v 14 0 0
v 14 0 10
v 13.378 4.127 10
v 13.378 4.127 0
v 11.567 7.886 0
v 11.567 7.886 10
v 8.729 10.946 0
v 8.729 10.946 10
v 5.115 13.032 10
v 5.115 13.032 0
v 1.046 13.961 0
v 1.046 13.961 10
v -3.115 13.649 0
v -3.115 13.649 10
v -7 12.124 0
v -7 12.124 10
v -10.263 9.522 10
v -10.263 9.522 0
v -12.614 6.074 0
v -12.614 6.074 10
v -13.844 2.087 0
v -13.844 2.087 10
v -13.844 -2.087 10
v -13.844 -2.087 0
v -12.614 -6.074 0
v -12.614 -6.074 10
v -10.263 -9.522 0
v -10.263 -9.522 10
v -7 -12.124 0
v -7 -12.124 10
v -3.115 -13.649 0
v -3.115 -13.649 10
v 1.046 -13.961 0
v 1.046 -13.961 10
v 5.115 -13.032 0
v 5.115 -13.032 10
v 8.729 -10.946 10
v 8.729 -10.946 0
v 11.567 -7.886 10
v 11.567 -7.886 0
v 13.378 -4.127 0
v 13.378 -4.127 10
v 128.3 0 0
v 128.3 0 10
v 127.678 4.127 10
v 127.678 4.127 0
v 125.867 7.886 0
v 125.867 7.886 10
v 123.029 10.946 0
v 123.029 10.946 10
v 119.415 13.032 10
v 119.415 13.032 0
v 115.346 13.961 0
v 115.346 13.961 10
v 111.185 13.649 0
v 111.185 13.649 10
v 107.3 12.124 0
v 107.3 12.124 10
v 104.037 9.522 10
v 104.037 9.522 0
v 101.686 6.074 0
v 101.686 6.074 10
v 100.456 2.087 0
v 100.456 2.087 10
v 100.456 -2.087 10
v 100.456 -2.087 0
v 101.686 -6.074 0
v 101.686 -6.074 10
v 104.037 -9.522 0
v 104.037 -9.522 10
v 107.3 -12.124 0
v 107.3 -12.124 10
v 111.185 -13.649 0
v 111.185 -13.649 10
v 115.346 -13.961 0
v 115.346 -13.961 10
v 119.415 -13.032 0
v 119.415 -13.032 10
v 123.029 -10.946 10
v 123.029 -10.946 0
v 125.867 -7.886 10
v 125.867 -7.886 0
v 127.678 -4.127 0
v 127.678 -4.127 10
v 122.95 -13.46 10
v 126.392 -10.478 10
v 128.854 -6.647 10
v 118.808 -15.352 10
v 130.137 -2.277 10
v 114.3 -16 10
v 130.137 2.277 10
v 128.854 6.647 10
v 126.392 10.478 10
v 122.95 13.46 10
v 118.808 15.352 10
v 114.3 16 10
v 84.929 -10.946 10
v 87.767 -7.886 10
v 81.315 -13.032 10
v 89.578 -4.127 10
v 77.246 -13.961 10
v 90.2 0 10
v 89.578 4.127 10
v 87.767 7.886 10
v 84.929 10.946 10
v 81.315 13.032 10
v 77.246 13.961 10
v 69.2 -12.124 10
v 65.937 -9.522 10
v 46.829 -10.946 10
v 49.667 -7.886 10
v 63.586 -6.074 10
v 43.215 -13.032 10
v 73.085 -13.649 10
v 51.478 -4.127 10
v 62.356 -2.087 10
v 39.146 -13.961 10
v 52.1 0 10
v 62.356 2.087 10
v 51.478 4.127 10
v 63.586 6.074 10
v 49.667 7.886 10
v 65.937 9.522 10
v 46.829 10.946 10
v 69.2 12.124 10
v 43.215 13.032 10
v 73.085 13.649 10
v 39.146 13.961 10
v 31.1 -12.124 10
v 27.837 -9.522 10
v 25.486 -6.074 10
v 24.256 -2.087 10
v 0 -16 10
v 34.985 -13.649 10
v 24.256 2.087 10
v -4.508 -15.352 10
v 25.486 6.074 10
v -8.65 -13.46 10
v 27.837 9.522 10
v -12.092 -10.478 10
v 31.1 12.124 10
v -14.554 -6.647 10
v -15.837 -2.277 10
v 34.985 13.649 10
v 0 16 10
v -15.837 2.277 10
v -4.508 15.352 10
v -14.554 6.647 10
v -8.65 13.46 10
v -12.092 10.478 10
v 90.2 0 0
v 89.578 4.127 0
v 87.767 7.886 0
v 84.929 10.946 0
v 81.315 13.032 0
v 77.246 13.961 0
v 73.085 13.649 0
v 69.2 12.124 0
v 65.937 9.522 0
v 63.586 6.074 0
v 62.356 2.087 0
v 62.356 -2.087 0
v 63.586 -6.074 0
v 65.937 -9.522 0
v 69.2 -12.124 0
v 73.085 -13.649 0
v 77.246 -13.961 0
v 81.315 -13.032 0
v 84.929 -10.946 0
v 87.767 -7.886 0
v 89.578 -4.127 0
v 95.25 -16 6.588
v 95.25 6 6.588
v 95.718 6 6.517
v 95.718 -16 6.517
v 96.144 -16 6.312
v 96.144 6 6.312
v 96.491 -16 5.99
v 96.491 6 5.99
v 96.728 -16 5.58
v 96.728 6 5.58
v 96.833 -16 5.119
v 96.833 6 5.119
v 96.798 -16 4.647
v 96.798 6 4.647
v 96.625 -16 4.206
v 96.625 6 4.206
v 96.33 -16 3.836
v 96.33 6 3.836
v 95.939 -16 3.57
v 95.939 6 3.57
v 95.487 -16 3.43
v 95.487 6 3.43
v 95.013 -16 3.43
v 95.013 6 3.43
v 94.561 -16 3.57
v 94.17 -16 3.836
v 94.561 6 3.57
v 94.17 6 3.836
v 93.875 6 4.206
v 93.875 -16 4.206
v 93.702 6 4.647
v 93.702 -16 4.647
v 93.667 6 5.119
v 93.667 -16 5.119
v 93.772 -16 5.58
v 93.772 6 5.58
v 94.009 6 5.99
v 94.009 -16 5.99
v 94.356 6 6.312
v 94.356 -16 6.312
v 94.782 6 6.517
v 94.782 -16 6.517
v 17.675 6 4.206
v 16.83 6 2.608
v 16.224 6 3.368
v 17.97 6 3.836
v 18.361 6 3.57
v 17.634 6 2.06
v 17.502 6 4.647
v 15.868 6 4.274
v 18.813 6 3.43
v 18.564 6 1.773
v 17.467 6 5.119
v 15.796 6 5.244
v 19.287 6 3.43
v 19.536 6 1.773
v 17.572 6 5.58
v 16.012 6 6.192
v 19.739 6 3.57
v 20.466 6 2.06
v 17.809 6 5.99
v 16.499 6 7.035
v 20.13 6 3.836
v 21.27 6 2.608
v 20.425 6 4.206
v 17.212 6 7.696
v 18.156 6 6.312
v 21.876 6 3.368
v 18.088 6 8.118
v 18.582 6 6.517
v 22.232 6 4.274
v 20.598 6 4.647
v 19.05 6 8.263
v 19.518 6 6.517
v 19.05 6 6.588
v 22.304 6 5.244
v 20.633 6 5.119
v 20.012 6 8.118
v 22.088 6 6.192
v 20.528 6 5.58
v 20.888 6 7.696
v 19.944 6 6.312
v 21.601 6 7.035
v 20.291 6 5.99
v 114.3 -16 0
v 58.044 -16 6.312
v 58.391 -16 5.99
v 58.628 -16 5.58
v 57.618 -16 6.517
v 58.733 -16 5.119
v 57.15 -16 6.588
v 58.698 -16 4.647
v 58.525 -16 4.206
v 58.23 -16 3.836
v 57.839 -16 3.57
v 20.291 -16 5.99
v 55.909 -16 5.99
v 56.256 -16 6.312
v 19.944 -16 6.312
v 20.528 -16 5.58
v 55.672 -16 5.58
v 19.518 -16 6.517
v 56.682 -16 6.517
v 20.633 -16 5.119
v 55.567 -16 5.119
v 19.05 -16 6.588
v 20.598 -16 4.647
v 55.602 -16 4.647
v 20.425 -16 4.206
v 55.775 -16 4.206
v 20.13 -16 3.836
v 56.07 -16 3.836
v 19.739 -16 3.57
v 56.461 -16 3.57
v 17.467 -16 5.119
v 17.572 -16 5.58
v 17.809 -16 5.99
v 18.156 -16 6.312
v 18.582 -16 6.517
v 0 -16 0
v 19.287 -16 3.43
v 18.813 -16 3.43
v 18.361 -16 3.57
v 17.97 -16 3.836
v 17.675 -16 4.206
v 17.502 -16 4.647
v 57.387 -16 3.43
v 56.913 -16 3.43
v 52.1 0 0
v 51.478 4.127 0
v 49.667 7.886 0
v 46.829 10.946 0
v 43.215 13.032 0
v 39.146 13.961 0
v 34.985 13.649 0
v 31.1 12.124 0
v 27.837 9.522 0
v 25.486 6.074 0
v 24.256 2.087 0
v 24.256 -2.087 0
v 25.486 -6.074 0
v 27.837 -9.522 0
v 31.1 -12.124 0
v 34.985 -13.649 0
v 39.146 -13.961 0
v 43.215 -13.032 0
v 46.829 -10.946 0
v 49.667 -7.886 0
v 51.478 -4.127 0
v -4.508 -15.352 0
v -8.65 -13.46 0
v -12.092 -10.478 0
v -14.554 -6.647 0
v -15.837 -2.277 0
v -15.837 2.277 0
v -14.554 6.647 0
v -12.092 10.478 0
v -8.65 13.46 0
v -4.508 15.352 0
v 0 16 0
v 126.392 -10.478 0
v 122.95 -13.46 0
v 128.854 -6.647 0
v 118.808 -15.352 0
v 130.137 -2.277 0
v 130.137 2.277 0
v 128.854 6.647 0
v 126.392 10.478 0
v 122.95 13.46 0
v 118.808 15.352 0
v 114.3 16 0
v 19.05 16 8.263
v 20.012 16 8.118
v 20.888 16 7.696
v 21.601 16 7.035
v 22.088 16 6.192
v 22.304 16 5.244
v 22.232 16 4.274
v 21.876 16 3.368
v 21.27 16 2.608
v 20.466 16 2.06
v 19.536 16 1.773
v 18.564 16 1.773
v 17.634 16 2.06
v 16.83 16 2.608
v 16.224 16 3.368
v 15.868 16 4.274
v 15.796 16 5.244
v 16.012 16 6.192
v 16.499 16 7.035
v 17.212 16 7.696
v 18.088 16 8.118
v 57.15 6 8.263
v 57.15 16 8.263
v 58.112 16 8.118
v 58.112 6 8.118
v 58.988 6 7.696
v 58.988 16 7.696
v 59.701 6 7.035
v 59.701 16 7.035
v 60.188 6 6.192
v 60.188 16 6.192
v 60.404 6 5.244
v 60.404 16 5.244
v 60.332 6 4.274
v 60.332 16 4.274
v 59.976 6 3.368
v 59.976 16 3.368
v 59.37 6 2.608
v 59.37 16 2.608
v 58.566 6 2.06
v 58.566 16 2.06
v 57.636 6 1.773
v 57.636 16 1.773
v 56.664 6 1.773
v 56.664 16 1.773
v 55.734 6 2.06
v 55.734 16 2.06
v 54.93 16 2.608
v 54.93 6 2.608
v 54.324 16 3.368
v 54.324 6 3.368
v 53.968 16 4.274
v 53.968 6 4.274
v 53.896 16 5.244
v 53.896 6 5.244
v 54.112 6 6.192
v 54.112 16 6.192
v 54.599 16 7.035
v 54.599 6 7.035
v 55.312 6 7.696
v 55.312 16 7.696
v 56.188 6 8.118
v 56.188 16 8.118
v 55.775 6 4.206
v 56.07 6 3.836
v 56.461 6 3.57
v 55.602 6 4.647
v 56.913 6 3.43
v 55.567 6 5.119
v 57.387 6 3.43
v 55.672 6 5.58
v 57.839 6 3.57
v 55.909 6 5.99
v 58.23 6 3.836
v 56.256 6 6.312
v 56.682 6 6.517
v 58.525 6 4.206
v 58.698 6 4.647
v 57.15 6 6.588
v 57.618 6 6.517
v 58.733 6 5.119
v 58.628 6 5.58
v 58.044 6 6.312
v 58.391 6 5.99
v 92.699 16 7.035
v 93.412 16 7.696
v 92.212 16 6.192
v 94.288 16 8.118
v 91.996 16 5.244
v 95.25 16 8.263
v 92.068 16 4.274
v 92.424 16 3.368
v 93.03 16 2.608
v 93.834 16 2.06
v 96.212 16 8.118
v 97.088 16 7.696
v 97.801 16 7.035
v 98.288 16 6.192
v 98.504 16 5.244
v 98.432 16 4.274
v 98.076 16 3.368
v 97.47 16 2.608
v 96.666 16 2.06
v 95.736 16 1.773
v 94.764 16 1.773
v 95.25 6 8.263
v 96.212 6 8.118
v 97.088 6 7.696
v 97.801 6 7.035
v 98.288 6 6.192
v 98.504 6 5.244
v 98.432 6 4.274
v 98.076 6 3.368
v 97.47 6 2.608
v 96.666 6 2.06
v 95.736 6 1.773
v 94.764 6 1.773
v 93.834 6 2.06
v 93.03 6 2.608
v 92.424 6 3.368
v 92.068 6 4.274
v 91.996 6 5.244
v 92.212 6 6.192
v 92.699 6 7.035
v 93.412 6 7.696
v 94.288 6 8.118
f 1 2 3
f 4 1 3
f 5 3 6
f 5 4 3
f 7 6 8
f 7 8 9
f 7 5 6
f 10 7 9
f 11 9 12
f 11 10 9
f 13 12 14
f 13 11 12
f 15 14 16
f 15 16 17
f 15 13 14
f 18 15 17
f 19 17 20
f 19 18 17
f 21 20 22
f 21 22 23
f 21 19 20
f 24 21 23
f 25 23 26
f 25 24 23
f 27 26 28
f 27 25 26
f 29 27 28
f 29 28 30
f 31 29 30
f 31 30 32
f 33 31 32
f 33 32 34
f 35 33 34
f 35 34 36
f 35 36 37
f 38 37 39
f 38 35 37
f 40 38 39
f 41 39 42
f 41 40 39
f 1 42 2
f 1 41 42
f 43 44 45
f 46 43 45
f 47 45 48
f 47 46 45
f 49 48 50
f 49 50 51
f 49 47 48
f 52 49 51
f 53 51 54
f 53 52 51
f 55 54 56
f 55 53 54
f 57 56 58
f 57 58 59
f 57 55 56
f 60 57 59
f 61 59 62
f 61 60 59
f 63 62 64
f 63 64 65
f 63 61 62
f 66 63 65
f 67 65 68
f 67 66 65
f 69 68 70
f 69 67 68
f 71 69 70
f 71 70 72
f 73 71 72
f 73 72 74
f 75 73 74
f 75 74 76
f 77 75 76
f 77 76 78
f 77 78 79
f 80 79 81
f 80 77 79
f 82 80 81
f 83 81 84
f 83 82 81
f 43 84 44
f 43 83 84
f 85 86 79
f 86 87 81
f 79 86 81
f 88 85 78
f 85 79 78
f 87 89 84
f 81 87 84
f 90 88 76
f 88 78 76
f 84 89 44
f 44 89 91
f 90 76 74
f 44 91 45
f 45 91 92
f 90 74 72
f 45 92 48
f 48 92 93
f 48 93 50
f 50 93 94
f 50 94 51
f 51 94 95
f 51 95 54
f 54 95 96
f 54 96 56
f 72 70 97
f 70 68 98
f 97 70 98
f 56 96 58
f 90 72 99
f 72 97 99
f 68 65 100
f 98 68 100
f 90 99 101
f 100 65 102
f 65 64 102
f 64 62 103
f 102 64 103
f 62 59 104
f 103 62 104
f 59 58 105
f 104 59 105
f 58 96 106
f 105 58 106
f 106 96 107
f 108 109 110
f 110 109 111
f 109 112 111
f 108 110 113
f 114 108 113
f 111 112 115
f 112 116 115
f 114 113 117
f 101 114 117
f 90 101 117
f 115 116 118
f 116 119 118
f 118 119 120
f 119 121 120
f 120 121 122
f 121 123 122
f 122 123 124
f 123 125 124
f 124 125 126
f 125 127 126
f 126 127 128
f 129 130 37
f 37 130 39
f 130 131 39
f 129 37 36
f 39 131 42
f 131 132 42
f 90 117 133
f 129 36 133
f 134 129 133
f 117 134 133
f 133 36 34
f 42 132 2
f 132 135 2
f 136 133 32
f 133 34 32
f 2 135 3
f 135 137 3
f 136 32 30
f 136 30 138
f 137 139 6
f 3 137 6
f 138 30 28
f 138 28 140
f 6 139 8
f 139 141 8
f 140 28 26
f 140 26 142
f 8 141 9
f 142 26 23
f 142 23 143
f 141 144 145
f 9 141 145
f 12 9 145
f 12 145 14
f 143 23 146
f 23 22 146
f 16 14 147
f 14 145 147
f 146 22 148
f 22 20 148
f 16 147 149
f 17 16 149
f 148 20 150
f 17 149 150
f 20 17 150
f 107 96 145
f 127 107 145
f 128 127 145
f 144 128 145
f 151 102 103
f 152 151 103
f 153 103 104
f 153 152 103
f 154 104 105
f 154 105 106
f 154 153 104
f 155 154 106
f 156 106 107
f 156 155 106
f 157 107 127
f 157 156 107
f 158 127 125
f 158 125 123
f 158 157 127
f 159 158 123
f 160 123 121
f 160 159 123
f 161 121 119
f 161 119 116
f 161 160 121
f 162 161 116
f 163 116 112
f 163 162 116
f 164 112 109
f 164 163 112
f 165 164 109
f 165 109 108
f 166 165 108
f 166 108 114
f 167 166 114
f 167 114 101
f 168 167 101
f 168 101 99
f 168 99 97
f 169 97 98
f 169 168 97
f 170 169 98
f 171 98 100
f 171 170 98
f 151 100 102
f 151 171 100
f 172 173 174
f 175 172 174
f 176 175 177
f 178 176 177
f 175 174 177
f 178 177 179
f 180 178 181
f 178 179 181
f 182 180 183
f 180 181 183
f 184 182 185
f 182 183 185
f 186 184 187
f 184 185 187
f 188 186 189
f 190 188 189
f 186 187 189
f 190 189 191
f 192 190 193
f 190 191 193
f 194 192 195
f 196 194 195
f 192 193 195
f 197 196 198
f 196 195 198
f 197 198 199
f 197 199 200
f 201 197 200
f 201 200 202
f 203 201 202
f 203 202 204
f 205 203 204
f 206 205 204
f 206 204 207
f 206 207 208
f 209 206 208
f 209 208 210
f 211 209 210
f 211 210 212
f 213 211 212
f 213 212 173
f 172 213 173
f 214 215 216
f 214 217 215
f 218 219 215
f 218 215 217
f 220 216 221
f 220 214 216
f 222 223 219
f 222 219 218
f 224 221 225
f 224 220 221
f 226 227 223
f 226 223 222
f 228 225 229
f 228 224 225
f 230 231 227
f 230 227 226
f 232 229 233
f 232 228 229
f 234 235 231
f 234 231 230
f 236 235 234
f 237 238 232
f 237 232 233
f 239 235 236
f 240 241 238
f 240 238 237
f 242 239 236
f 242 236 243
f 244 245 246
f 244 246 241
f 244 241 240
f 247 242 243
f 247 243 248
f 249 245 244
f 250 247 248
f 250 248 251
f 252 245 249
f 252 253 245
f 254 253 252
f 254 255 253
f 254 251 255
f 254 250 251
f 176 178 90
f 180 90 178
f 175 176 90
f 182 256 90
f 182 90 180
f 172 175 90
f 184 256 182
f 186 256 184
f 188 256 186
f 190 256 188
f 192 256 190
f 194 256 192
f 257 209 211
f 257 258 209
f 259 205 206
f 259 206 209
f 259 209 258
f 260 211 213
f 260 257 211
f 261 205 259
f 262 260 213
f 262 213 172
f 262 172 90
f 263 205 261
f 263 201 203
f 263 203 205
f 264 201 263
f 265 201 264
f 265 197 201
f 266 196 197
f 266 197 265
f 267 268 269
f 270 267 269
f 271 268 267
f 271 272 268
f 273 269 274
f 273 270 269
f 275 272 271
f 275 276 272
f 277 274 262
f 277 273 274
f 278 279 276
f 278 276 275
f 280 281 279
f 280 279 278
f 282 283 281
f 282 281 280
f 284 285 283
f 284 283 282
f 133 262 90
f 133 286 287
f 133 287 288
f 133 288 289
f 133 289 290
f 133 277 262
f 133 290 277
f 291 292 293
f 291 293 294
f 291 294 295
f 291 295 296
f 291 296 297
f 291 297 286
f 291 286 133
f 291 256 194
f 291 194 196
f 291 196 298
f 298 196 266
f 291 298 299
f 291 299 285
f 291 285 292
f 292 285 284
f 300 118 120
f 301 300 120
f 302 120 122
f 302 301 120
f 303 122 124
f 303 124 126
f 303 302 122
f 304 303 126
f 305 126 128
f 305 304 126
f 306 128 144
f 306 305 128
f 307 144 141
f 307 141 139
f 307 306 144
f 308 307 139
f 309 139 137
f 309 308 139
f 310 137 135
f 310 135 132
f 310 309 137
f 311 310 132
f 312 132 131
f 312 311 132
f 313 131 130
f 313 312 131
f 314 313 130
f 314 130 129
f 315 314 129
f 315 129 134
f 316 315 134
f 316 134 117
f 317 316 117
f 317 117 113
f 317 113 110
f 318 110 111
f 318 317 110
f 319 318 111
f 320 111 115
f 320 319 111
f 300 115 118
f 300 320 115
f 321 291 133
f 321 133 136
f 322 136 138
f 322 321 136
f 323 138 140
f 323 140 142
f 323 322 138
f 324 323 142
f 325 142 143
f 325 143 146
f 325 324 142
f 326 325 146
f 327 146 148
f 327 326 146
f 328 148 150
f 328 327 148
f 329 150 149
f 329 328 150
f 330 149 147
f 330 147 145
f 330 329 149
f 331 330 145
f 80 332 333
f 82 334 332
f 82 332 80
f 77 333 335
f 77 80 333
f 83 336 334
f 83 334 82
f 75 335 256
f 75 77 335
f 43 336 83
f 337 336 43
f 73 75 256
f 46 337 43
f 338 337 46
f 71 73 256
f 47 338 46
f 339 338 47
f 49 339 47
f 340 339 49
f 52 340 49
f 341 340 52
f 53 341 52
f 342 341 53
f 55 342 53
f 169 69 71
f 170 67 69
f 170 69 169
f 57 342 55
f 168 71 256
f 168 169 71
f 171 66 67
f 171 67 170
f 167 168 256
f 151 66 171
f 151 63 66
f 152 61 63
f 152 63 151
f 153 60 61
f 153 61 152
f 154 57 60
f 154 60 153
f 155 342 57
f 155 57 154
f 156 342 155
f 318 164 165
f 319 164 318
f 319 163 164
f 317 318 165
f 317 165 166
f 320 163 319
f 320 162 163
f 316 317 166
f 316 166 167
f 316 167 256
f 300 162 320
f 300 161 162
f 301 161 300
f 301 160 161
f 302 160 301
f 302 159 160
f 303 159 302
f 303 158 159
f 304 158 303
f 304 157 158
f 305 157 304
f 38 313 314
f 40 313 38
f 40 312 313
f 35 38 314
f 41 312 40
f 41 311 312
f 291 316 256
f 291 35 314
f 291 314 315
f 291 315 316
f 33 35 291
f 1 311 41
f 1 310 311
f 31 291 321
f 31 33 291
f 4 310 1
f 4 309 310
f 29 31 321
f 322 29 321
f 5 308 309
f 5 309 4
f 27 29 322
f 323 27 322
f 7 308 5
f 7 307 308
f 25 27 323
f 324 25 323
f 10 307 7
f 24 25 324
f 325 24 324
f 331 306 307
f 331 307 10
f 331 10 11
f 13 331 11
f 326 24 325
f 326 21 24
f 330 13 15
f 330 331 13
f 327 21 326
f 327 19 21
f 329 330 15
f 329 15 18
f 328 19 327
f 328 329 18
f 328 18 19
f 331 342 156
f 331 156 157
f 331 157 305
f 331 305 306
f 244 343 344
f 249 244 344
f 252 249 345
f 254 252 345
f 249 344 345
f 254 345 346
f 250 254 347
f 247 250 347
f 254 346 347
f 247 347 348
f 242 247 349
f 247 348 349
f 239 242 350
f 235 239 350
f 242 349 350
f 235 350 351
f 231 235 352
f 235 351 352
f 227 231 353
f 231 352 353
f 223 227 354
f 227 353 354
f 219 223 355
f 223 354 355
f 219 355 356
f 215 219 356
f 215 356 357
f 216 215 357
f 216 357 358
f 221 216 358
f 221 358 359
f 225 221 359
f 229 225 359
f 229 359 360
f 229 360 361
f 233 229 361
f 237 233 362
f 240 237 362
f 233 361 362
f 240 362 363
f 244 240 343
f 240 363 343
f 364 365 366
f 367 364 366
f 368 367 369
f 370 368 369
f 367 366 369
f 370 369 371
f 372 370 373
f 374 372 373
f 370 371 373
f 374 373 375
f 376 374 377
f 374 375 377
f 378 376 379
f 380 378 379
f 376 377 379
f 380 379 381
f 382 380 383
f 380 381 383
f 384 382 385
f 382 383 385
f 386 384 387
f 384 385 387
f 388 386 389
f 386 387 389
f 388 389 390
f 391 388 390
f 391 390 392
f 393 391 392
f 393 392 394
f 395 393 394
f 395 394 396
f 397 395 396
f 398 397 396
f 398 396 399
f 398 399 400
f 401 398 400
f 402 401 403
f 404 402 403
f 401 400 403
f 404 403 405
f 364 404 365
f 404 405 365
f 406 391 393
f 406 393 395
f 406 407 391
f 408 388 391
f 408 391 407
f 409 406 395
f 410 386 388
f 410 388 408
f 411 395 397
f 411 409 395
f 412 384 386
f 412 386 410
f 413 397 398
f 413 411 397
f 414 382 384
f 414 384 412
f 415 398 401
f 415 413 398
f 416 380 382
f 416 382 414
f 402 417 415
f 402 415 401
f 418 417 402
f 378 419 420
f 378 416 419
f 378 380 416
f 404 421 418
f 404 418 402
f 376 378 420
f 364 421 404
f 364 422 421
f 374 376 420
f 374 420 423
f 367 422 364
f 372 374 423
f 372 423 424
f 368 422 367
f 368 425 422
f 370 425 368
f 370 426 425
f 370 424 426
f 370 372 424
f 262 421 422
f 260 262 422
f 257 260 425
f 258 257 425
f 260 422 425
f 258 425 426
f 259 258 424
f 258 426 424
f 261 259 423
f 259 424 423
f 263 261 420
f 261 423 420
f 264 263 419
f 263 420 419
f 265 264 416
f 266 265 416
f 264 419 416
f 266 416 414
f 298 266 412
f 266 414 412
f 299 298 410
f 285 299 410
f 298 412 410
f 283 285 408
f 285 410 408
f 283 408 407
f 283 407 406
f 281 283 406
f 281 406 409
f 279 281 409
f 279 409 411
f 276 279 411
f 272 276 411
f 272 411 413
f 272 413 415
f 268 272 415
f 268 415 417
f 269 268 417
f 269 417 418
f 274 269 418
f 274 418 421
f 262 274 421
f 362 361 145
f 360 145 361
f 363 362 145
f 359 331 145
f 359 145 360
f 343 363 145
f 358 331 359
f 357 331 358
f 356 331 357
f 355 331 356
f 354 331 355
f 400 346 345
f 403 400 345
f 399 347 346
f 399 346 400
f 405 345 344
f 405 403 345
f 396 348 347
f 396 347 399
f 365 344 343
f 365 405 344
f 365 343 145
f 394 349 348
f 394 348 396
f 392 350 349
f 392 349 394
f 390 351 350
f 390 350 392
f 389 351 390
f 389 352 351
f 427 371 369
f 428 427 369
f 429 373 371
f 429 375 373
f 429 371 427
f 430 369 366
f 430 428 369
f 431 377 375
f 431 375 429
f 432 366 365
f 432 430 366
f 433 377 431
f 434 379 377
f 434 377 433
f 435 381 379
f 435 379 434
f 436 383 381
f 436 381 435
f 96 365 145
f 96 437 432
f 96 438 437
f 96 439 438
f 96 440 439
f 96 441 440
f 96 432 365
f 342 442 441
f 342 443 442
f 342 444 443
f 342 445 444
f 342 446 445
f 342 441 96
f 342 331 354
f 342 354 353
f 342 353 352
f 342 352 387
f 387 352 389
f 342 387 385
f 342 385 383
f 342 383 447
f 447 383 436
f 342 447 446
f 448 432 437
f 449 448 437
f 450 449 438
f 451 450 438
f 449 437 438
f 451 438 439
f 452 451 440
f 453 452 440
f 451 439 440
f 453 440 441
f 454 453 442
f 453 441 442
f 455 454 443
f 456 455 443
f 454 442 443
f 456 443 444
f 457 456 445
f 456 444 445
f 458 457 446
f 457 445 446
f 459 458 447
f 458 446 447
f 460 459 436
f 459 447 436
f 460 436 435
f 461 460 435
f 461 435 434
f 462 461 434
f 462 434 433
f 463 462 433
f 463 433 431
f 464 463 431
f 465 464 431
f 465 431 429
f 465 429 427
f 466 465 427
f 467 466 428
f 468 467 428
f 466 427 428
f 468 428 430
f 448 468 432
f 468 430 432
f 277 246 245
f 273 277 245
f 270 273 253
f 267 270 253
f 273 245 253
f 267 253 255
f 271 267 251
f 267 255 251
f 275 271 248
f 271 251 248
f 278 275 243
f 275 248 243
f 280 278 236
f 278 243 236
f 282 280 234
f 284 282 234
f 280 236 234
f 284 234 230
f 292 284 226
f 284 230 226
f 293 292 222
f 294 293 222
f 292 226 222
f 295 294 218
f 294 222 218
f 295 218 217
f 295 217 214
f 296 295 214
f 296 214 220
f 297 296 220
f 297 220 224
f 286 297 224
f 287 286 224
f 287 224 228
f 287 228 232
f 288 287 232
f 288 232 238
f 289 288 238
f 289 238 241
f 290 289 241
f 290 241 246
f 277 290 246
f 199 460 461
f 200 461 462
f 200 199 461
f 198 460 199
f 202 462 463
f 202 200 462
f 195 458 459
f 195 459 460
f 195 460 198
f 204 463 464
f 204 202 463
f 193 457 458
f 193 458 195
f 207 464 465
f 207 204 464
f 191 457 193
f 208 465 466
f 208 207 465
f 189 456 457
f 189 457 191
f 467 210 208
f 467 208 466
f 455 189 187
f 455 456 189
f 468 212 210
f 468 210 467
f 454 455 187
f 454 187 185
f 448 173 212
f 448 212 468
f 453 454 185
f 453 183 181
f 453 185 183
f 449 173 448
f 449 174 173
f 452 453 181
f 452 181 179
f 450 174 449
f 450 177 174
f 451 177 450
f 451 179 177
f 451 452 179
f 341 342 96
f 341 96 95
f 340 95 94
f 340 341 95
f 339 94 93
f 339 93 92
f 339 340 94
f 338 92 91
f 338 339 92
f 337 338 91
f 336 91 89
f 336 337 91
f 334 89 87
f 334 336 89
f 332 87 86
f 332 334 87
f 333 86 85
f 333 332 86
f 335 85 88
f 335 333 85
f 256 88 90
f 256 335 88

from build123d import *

# Parameters (mm, degrees)
SKETCH1_R           = 14
BOSS_EXTRUDE1_DEPTH = 10
SKETCH3_R           = 3.263423297
CUT_EXTRUDE1_DEPTH  = 10
SKETCH4_R           = 1.5875
CUT_EXTRUDE2_DEPTH  = 133.522035903
LPATTERN1_COUNT     = 3
LPATTERN1_PITCH     = 38.1


with BuildPart() as part:
    # Sketch1 → Boss-Extrude1 (new body)
    with BuildSketch(Plane.XY):
        with BuildLine():
            Line((0, 16), (114.3, 16))
            ThreePointArc((114.3, 16), (130.3, 0), (114.3, -16))
            Line((114.3, -16), (0, -16))
            ThreePointArc((0, -16), (-16, 0), (0, 16))
        make_face()
        Circle(SKETCH1_R, mode=Mode.SUBTRACT)
        with Locations((38.1, 0)):
            Circle(SKETCH1_R, mode=Mode.SUBTRACT)
        with Locations((76.2, 0)):
            Circle(SKETCH1_R, mode=Mode.SUBTRACT)
        with Locations((114.3, 0)):
            Circle(SKETCH1_R, mode=Mode.SUBTRACT)
    extrude(amount=BOSS_EXTRUDE1_DEPTH)

    # Sketch3 → Cut-Extrude1 (cut)
    with BuildSketch(Plane(origin=(0, 16, 0), x_dir=(1, 0, 0), z_dir=(0, 1, 0))):
        with Locations(Location((19.05, -5, 0), (0, 0, 270))):
            Circle(SKETCH3_R)
    cut_extrude1 = extrude(amount=-CUT_EXTRUDE1_DEPTH, mode=Mode.SUBTRACT)

    # Sketch4 → Cut-Extrude2 (cut, through all)
    with BuildSketch(Plane(origin=(0, 6, 0), x_dir=(1, 0, 0), z_dir=(0, 1, 0))):
        with Locations(Location((19.05, -5, 0), (0, 0, 270))):
            Circle(SKETCH4_R)
    cut_extrude2 = extrude(amount=-CUT_EXTRUDE2_DEPTH, mode=Mode.SUBTRACT)

    # LPattern1: Cut-Extrude1, Cut-Extrude2 ×3
    with Locations(*[(i * LPATTERN1_PITCH, 0, 0) for i in range(1, LPATTERN1_COUNT)]):
        add(cut_extrude1, mode=Mode.SUBTRACT)
        add(cut_extrude2, mode=Mode.SUBTRACT)


solid = part.part
